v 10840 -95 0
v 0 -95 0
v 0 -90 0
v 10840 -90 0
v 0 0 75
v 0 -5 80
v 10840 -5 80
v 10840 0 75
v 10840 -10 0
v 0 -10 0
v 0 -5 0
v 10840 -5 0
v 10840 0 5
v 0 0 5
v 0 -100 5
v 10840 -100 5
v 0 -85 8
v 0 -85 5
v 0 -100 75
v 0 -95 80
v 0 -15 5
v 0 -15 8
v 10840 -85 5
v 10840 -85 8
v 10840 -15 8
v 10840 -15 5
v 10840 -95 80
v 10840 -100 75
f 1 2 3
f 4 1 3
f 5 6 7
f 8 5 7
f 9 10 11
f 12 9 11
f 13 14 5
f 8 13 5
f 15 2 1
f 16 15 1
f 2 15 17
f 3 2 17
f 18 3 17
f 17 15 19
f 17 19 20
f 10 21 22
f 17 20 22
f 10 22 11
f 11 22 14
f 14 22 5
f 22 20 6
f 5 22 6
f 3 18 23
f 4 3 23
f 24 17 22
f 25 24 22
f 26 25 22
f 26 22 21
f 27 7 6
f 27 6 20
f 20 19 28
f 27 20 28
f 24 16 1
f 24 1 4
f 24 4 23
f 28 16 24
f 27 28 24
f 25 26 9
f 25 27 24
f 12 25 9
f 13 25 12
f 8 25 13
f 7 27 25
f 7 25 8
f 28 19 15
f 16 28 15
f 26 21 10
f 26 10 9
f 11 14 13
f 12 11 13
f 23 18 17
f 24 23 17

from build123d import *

# Parameters (mm, degrees)
F1_DEPTH = 10840
F2_SIZE  = 5


# Not quite as in the source:
# - a feature names something its author has since deleted; it is built from what else it names


with BuildPart() as f1:
    # F0 (on Right) → F1 (new body)
    with BuildSketch(Plane.YZ):
        Polygon((-15, 0), (0, 0), (0, 80), (-100, 80), (-100, 0), (-85, 0), (-85, 8), (-15, 8), align=None)
    extrude(amount=F1_DEPTH)

    # F2
    f2_edges = [f1.edges().sort_by_distance(p)[0] for p in [
        (5420, -100, 0),
        (5420, -100, 80),
        (5420, 0, 80),
        (5420, 0, 0),
        (5420, -15, 0),
        (5420, -85, 0),
    ]]
    chamfer(f2_edges, length=F2_SIZE)


solid = f1.part
